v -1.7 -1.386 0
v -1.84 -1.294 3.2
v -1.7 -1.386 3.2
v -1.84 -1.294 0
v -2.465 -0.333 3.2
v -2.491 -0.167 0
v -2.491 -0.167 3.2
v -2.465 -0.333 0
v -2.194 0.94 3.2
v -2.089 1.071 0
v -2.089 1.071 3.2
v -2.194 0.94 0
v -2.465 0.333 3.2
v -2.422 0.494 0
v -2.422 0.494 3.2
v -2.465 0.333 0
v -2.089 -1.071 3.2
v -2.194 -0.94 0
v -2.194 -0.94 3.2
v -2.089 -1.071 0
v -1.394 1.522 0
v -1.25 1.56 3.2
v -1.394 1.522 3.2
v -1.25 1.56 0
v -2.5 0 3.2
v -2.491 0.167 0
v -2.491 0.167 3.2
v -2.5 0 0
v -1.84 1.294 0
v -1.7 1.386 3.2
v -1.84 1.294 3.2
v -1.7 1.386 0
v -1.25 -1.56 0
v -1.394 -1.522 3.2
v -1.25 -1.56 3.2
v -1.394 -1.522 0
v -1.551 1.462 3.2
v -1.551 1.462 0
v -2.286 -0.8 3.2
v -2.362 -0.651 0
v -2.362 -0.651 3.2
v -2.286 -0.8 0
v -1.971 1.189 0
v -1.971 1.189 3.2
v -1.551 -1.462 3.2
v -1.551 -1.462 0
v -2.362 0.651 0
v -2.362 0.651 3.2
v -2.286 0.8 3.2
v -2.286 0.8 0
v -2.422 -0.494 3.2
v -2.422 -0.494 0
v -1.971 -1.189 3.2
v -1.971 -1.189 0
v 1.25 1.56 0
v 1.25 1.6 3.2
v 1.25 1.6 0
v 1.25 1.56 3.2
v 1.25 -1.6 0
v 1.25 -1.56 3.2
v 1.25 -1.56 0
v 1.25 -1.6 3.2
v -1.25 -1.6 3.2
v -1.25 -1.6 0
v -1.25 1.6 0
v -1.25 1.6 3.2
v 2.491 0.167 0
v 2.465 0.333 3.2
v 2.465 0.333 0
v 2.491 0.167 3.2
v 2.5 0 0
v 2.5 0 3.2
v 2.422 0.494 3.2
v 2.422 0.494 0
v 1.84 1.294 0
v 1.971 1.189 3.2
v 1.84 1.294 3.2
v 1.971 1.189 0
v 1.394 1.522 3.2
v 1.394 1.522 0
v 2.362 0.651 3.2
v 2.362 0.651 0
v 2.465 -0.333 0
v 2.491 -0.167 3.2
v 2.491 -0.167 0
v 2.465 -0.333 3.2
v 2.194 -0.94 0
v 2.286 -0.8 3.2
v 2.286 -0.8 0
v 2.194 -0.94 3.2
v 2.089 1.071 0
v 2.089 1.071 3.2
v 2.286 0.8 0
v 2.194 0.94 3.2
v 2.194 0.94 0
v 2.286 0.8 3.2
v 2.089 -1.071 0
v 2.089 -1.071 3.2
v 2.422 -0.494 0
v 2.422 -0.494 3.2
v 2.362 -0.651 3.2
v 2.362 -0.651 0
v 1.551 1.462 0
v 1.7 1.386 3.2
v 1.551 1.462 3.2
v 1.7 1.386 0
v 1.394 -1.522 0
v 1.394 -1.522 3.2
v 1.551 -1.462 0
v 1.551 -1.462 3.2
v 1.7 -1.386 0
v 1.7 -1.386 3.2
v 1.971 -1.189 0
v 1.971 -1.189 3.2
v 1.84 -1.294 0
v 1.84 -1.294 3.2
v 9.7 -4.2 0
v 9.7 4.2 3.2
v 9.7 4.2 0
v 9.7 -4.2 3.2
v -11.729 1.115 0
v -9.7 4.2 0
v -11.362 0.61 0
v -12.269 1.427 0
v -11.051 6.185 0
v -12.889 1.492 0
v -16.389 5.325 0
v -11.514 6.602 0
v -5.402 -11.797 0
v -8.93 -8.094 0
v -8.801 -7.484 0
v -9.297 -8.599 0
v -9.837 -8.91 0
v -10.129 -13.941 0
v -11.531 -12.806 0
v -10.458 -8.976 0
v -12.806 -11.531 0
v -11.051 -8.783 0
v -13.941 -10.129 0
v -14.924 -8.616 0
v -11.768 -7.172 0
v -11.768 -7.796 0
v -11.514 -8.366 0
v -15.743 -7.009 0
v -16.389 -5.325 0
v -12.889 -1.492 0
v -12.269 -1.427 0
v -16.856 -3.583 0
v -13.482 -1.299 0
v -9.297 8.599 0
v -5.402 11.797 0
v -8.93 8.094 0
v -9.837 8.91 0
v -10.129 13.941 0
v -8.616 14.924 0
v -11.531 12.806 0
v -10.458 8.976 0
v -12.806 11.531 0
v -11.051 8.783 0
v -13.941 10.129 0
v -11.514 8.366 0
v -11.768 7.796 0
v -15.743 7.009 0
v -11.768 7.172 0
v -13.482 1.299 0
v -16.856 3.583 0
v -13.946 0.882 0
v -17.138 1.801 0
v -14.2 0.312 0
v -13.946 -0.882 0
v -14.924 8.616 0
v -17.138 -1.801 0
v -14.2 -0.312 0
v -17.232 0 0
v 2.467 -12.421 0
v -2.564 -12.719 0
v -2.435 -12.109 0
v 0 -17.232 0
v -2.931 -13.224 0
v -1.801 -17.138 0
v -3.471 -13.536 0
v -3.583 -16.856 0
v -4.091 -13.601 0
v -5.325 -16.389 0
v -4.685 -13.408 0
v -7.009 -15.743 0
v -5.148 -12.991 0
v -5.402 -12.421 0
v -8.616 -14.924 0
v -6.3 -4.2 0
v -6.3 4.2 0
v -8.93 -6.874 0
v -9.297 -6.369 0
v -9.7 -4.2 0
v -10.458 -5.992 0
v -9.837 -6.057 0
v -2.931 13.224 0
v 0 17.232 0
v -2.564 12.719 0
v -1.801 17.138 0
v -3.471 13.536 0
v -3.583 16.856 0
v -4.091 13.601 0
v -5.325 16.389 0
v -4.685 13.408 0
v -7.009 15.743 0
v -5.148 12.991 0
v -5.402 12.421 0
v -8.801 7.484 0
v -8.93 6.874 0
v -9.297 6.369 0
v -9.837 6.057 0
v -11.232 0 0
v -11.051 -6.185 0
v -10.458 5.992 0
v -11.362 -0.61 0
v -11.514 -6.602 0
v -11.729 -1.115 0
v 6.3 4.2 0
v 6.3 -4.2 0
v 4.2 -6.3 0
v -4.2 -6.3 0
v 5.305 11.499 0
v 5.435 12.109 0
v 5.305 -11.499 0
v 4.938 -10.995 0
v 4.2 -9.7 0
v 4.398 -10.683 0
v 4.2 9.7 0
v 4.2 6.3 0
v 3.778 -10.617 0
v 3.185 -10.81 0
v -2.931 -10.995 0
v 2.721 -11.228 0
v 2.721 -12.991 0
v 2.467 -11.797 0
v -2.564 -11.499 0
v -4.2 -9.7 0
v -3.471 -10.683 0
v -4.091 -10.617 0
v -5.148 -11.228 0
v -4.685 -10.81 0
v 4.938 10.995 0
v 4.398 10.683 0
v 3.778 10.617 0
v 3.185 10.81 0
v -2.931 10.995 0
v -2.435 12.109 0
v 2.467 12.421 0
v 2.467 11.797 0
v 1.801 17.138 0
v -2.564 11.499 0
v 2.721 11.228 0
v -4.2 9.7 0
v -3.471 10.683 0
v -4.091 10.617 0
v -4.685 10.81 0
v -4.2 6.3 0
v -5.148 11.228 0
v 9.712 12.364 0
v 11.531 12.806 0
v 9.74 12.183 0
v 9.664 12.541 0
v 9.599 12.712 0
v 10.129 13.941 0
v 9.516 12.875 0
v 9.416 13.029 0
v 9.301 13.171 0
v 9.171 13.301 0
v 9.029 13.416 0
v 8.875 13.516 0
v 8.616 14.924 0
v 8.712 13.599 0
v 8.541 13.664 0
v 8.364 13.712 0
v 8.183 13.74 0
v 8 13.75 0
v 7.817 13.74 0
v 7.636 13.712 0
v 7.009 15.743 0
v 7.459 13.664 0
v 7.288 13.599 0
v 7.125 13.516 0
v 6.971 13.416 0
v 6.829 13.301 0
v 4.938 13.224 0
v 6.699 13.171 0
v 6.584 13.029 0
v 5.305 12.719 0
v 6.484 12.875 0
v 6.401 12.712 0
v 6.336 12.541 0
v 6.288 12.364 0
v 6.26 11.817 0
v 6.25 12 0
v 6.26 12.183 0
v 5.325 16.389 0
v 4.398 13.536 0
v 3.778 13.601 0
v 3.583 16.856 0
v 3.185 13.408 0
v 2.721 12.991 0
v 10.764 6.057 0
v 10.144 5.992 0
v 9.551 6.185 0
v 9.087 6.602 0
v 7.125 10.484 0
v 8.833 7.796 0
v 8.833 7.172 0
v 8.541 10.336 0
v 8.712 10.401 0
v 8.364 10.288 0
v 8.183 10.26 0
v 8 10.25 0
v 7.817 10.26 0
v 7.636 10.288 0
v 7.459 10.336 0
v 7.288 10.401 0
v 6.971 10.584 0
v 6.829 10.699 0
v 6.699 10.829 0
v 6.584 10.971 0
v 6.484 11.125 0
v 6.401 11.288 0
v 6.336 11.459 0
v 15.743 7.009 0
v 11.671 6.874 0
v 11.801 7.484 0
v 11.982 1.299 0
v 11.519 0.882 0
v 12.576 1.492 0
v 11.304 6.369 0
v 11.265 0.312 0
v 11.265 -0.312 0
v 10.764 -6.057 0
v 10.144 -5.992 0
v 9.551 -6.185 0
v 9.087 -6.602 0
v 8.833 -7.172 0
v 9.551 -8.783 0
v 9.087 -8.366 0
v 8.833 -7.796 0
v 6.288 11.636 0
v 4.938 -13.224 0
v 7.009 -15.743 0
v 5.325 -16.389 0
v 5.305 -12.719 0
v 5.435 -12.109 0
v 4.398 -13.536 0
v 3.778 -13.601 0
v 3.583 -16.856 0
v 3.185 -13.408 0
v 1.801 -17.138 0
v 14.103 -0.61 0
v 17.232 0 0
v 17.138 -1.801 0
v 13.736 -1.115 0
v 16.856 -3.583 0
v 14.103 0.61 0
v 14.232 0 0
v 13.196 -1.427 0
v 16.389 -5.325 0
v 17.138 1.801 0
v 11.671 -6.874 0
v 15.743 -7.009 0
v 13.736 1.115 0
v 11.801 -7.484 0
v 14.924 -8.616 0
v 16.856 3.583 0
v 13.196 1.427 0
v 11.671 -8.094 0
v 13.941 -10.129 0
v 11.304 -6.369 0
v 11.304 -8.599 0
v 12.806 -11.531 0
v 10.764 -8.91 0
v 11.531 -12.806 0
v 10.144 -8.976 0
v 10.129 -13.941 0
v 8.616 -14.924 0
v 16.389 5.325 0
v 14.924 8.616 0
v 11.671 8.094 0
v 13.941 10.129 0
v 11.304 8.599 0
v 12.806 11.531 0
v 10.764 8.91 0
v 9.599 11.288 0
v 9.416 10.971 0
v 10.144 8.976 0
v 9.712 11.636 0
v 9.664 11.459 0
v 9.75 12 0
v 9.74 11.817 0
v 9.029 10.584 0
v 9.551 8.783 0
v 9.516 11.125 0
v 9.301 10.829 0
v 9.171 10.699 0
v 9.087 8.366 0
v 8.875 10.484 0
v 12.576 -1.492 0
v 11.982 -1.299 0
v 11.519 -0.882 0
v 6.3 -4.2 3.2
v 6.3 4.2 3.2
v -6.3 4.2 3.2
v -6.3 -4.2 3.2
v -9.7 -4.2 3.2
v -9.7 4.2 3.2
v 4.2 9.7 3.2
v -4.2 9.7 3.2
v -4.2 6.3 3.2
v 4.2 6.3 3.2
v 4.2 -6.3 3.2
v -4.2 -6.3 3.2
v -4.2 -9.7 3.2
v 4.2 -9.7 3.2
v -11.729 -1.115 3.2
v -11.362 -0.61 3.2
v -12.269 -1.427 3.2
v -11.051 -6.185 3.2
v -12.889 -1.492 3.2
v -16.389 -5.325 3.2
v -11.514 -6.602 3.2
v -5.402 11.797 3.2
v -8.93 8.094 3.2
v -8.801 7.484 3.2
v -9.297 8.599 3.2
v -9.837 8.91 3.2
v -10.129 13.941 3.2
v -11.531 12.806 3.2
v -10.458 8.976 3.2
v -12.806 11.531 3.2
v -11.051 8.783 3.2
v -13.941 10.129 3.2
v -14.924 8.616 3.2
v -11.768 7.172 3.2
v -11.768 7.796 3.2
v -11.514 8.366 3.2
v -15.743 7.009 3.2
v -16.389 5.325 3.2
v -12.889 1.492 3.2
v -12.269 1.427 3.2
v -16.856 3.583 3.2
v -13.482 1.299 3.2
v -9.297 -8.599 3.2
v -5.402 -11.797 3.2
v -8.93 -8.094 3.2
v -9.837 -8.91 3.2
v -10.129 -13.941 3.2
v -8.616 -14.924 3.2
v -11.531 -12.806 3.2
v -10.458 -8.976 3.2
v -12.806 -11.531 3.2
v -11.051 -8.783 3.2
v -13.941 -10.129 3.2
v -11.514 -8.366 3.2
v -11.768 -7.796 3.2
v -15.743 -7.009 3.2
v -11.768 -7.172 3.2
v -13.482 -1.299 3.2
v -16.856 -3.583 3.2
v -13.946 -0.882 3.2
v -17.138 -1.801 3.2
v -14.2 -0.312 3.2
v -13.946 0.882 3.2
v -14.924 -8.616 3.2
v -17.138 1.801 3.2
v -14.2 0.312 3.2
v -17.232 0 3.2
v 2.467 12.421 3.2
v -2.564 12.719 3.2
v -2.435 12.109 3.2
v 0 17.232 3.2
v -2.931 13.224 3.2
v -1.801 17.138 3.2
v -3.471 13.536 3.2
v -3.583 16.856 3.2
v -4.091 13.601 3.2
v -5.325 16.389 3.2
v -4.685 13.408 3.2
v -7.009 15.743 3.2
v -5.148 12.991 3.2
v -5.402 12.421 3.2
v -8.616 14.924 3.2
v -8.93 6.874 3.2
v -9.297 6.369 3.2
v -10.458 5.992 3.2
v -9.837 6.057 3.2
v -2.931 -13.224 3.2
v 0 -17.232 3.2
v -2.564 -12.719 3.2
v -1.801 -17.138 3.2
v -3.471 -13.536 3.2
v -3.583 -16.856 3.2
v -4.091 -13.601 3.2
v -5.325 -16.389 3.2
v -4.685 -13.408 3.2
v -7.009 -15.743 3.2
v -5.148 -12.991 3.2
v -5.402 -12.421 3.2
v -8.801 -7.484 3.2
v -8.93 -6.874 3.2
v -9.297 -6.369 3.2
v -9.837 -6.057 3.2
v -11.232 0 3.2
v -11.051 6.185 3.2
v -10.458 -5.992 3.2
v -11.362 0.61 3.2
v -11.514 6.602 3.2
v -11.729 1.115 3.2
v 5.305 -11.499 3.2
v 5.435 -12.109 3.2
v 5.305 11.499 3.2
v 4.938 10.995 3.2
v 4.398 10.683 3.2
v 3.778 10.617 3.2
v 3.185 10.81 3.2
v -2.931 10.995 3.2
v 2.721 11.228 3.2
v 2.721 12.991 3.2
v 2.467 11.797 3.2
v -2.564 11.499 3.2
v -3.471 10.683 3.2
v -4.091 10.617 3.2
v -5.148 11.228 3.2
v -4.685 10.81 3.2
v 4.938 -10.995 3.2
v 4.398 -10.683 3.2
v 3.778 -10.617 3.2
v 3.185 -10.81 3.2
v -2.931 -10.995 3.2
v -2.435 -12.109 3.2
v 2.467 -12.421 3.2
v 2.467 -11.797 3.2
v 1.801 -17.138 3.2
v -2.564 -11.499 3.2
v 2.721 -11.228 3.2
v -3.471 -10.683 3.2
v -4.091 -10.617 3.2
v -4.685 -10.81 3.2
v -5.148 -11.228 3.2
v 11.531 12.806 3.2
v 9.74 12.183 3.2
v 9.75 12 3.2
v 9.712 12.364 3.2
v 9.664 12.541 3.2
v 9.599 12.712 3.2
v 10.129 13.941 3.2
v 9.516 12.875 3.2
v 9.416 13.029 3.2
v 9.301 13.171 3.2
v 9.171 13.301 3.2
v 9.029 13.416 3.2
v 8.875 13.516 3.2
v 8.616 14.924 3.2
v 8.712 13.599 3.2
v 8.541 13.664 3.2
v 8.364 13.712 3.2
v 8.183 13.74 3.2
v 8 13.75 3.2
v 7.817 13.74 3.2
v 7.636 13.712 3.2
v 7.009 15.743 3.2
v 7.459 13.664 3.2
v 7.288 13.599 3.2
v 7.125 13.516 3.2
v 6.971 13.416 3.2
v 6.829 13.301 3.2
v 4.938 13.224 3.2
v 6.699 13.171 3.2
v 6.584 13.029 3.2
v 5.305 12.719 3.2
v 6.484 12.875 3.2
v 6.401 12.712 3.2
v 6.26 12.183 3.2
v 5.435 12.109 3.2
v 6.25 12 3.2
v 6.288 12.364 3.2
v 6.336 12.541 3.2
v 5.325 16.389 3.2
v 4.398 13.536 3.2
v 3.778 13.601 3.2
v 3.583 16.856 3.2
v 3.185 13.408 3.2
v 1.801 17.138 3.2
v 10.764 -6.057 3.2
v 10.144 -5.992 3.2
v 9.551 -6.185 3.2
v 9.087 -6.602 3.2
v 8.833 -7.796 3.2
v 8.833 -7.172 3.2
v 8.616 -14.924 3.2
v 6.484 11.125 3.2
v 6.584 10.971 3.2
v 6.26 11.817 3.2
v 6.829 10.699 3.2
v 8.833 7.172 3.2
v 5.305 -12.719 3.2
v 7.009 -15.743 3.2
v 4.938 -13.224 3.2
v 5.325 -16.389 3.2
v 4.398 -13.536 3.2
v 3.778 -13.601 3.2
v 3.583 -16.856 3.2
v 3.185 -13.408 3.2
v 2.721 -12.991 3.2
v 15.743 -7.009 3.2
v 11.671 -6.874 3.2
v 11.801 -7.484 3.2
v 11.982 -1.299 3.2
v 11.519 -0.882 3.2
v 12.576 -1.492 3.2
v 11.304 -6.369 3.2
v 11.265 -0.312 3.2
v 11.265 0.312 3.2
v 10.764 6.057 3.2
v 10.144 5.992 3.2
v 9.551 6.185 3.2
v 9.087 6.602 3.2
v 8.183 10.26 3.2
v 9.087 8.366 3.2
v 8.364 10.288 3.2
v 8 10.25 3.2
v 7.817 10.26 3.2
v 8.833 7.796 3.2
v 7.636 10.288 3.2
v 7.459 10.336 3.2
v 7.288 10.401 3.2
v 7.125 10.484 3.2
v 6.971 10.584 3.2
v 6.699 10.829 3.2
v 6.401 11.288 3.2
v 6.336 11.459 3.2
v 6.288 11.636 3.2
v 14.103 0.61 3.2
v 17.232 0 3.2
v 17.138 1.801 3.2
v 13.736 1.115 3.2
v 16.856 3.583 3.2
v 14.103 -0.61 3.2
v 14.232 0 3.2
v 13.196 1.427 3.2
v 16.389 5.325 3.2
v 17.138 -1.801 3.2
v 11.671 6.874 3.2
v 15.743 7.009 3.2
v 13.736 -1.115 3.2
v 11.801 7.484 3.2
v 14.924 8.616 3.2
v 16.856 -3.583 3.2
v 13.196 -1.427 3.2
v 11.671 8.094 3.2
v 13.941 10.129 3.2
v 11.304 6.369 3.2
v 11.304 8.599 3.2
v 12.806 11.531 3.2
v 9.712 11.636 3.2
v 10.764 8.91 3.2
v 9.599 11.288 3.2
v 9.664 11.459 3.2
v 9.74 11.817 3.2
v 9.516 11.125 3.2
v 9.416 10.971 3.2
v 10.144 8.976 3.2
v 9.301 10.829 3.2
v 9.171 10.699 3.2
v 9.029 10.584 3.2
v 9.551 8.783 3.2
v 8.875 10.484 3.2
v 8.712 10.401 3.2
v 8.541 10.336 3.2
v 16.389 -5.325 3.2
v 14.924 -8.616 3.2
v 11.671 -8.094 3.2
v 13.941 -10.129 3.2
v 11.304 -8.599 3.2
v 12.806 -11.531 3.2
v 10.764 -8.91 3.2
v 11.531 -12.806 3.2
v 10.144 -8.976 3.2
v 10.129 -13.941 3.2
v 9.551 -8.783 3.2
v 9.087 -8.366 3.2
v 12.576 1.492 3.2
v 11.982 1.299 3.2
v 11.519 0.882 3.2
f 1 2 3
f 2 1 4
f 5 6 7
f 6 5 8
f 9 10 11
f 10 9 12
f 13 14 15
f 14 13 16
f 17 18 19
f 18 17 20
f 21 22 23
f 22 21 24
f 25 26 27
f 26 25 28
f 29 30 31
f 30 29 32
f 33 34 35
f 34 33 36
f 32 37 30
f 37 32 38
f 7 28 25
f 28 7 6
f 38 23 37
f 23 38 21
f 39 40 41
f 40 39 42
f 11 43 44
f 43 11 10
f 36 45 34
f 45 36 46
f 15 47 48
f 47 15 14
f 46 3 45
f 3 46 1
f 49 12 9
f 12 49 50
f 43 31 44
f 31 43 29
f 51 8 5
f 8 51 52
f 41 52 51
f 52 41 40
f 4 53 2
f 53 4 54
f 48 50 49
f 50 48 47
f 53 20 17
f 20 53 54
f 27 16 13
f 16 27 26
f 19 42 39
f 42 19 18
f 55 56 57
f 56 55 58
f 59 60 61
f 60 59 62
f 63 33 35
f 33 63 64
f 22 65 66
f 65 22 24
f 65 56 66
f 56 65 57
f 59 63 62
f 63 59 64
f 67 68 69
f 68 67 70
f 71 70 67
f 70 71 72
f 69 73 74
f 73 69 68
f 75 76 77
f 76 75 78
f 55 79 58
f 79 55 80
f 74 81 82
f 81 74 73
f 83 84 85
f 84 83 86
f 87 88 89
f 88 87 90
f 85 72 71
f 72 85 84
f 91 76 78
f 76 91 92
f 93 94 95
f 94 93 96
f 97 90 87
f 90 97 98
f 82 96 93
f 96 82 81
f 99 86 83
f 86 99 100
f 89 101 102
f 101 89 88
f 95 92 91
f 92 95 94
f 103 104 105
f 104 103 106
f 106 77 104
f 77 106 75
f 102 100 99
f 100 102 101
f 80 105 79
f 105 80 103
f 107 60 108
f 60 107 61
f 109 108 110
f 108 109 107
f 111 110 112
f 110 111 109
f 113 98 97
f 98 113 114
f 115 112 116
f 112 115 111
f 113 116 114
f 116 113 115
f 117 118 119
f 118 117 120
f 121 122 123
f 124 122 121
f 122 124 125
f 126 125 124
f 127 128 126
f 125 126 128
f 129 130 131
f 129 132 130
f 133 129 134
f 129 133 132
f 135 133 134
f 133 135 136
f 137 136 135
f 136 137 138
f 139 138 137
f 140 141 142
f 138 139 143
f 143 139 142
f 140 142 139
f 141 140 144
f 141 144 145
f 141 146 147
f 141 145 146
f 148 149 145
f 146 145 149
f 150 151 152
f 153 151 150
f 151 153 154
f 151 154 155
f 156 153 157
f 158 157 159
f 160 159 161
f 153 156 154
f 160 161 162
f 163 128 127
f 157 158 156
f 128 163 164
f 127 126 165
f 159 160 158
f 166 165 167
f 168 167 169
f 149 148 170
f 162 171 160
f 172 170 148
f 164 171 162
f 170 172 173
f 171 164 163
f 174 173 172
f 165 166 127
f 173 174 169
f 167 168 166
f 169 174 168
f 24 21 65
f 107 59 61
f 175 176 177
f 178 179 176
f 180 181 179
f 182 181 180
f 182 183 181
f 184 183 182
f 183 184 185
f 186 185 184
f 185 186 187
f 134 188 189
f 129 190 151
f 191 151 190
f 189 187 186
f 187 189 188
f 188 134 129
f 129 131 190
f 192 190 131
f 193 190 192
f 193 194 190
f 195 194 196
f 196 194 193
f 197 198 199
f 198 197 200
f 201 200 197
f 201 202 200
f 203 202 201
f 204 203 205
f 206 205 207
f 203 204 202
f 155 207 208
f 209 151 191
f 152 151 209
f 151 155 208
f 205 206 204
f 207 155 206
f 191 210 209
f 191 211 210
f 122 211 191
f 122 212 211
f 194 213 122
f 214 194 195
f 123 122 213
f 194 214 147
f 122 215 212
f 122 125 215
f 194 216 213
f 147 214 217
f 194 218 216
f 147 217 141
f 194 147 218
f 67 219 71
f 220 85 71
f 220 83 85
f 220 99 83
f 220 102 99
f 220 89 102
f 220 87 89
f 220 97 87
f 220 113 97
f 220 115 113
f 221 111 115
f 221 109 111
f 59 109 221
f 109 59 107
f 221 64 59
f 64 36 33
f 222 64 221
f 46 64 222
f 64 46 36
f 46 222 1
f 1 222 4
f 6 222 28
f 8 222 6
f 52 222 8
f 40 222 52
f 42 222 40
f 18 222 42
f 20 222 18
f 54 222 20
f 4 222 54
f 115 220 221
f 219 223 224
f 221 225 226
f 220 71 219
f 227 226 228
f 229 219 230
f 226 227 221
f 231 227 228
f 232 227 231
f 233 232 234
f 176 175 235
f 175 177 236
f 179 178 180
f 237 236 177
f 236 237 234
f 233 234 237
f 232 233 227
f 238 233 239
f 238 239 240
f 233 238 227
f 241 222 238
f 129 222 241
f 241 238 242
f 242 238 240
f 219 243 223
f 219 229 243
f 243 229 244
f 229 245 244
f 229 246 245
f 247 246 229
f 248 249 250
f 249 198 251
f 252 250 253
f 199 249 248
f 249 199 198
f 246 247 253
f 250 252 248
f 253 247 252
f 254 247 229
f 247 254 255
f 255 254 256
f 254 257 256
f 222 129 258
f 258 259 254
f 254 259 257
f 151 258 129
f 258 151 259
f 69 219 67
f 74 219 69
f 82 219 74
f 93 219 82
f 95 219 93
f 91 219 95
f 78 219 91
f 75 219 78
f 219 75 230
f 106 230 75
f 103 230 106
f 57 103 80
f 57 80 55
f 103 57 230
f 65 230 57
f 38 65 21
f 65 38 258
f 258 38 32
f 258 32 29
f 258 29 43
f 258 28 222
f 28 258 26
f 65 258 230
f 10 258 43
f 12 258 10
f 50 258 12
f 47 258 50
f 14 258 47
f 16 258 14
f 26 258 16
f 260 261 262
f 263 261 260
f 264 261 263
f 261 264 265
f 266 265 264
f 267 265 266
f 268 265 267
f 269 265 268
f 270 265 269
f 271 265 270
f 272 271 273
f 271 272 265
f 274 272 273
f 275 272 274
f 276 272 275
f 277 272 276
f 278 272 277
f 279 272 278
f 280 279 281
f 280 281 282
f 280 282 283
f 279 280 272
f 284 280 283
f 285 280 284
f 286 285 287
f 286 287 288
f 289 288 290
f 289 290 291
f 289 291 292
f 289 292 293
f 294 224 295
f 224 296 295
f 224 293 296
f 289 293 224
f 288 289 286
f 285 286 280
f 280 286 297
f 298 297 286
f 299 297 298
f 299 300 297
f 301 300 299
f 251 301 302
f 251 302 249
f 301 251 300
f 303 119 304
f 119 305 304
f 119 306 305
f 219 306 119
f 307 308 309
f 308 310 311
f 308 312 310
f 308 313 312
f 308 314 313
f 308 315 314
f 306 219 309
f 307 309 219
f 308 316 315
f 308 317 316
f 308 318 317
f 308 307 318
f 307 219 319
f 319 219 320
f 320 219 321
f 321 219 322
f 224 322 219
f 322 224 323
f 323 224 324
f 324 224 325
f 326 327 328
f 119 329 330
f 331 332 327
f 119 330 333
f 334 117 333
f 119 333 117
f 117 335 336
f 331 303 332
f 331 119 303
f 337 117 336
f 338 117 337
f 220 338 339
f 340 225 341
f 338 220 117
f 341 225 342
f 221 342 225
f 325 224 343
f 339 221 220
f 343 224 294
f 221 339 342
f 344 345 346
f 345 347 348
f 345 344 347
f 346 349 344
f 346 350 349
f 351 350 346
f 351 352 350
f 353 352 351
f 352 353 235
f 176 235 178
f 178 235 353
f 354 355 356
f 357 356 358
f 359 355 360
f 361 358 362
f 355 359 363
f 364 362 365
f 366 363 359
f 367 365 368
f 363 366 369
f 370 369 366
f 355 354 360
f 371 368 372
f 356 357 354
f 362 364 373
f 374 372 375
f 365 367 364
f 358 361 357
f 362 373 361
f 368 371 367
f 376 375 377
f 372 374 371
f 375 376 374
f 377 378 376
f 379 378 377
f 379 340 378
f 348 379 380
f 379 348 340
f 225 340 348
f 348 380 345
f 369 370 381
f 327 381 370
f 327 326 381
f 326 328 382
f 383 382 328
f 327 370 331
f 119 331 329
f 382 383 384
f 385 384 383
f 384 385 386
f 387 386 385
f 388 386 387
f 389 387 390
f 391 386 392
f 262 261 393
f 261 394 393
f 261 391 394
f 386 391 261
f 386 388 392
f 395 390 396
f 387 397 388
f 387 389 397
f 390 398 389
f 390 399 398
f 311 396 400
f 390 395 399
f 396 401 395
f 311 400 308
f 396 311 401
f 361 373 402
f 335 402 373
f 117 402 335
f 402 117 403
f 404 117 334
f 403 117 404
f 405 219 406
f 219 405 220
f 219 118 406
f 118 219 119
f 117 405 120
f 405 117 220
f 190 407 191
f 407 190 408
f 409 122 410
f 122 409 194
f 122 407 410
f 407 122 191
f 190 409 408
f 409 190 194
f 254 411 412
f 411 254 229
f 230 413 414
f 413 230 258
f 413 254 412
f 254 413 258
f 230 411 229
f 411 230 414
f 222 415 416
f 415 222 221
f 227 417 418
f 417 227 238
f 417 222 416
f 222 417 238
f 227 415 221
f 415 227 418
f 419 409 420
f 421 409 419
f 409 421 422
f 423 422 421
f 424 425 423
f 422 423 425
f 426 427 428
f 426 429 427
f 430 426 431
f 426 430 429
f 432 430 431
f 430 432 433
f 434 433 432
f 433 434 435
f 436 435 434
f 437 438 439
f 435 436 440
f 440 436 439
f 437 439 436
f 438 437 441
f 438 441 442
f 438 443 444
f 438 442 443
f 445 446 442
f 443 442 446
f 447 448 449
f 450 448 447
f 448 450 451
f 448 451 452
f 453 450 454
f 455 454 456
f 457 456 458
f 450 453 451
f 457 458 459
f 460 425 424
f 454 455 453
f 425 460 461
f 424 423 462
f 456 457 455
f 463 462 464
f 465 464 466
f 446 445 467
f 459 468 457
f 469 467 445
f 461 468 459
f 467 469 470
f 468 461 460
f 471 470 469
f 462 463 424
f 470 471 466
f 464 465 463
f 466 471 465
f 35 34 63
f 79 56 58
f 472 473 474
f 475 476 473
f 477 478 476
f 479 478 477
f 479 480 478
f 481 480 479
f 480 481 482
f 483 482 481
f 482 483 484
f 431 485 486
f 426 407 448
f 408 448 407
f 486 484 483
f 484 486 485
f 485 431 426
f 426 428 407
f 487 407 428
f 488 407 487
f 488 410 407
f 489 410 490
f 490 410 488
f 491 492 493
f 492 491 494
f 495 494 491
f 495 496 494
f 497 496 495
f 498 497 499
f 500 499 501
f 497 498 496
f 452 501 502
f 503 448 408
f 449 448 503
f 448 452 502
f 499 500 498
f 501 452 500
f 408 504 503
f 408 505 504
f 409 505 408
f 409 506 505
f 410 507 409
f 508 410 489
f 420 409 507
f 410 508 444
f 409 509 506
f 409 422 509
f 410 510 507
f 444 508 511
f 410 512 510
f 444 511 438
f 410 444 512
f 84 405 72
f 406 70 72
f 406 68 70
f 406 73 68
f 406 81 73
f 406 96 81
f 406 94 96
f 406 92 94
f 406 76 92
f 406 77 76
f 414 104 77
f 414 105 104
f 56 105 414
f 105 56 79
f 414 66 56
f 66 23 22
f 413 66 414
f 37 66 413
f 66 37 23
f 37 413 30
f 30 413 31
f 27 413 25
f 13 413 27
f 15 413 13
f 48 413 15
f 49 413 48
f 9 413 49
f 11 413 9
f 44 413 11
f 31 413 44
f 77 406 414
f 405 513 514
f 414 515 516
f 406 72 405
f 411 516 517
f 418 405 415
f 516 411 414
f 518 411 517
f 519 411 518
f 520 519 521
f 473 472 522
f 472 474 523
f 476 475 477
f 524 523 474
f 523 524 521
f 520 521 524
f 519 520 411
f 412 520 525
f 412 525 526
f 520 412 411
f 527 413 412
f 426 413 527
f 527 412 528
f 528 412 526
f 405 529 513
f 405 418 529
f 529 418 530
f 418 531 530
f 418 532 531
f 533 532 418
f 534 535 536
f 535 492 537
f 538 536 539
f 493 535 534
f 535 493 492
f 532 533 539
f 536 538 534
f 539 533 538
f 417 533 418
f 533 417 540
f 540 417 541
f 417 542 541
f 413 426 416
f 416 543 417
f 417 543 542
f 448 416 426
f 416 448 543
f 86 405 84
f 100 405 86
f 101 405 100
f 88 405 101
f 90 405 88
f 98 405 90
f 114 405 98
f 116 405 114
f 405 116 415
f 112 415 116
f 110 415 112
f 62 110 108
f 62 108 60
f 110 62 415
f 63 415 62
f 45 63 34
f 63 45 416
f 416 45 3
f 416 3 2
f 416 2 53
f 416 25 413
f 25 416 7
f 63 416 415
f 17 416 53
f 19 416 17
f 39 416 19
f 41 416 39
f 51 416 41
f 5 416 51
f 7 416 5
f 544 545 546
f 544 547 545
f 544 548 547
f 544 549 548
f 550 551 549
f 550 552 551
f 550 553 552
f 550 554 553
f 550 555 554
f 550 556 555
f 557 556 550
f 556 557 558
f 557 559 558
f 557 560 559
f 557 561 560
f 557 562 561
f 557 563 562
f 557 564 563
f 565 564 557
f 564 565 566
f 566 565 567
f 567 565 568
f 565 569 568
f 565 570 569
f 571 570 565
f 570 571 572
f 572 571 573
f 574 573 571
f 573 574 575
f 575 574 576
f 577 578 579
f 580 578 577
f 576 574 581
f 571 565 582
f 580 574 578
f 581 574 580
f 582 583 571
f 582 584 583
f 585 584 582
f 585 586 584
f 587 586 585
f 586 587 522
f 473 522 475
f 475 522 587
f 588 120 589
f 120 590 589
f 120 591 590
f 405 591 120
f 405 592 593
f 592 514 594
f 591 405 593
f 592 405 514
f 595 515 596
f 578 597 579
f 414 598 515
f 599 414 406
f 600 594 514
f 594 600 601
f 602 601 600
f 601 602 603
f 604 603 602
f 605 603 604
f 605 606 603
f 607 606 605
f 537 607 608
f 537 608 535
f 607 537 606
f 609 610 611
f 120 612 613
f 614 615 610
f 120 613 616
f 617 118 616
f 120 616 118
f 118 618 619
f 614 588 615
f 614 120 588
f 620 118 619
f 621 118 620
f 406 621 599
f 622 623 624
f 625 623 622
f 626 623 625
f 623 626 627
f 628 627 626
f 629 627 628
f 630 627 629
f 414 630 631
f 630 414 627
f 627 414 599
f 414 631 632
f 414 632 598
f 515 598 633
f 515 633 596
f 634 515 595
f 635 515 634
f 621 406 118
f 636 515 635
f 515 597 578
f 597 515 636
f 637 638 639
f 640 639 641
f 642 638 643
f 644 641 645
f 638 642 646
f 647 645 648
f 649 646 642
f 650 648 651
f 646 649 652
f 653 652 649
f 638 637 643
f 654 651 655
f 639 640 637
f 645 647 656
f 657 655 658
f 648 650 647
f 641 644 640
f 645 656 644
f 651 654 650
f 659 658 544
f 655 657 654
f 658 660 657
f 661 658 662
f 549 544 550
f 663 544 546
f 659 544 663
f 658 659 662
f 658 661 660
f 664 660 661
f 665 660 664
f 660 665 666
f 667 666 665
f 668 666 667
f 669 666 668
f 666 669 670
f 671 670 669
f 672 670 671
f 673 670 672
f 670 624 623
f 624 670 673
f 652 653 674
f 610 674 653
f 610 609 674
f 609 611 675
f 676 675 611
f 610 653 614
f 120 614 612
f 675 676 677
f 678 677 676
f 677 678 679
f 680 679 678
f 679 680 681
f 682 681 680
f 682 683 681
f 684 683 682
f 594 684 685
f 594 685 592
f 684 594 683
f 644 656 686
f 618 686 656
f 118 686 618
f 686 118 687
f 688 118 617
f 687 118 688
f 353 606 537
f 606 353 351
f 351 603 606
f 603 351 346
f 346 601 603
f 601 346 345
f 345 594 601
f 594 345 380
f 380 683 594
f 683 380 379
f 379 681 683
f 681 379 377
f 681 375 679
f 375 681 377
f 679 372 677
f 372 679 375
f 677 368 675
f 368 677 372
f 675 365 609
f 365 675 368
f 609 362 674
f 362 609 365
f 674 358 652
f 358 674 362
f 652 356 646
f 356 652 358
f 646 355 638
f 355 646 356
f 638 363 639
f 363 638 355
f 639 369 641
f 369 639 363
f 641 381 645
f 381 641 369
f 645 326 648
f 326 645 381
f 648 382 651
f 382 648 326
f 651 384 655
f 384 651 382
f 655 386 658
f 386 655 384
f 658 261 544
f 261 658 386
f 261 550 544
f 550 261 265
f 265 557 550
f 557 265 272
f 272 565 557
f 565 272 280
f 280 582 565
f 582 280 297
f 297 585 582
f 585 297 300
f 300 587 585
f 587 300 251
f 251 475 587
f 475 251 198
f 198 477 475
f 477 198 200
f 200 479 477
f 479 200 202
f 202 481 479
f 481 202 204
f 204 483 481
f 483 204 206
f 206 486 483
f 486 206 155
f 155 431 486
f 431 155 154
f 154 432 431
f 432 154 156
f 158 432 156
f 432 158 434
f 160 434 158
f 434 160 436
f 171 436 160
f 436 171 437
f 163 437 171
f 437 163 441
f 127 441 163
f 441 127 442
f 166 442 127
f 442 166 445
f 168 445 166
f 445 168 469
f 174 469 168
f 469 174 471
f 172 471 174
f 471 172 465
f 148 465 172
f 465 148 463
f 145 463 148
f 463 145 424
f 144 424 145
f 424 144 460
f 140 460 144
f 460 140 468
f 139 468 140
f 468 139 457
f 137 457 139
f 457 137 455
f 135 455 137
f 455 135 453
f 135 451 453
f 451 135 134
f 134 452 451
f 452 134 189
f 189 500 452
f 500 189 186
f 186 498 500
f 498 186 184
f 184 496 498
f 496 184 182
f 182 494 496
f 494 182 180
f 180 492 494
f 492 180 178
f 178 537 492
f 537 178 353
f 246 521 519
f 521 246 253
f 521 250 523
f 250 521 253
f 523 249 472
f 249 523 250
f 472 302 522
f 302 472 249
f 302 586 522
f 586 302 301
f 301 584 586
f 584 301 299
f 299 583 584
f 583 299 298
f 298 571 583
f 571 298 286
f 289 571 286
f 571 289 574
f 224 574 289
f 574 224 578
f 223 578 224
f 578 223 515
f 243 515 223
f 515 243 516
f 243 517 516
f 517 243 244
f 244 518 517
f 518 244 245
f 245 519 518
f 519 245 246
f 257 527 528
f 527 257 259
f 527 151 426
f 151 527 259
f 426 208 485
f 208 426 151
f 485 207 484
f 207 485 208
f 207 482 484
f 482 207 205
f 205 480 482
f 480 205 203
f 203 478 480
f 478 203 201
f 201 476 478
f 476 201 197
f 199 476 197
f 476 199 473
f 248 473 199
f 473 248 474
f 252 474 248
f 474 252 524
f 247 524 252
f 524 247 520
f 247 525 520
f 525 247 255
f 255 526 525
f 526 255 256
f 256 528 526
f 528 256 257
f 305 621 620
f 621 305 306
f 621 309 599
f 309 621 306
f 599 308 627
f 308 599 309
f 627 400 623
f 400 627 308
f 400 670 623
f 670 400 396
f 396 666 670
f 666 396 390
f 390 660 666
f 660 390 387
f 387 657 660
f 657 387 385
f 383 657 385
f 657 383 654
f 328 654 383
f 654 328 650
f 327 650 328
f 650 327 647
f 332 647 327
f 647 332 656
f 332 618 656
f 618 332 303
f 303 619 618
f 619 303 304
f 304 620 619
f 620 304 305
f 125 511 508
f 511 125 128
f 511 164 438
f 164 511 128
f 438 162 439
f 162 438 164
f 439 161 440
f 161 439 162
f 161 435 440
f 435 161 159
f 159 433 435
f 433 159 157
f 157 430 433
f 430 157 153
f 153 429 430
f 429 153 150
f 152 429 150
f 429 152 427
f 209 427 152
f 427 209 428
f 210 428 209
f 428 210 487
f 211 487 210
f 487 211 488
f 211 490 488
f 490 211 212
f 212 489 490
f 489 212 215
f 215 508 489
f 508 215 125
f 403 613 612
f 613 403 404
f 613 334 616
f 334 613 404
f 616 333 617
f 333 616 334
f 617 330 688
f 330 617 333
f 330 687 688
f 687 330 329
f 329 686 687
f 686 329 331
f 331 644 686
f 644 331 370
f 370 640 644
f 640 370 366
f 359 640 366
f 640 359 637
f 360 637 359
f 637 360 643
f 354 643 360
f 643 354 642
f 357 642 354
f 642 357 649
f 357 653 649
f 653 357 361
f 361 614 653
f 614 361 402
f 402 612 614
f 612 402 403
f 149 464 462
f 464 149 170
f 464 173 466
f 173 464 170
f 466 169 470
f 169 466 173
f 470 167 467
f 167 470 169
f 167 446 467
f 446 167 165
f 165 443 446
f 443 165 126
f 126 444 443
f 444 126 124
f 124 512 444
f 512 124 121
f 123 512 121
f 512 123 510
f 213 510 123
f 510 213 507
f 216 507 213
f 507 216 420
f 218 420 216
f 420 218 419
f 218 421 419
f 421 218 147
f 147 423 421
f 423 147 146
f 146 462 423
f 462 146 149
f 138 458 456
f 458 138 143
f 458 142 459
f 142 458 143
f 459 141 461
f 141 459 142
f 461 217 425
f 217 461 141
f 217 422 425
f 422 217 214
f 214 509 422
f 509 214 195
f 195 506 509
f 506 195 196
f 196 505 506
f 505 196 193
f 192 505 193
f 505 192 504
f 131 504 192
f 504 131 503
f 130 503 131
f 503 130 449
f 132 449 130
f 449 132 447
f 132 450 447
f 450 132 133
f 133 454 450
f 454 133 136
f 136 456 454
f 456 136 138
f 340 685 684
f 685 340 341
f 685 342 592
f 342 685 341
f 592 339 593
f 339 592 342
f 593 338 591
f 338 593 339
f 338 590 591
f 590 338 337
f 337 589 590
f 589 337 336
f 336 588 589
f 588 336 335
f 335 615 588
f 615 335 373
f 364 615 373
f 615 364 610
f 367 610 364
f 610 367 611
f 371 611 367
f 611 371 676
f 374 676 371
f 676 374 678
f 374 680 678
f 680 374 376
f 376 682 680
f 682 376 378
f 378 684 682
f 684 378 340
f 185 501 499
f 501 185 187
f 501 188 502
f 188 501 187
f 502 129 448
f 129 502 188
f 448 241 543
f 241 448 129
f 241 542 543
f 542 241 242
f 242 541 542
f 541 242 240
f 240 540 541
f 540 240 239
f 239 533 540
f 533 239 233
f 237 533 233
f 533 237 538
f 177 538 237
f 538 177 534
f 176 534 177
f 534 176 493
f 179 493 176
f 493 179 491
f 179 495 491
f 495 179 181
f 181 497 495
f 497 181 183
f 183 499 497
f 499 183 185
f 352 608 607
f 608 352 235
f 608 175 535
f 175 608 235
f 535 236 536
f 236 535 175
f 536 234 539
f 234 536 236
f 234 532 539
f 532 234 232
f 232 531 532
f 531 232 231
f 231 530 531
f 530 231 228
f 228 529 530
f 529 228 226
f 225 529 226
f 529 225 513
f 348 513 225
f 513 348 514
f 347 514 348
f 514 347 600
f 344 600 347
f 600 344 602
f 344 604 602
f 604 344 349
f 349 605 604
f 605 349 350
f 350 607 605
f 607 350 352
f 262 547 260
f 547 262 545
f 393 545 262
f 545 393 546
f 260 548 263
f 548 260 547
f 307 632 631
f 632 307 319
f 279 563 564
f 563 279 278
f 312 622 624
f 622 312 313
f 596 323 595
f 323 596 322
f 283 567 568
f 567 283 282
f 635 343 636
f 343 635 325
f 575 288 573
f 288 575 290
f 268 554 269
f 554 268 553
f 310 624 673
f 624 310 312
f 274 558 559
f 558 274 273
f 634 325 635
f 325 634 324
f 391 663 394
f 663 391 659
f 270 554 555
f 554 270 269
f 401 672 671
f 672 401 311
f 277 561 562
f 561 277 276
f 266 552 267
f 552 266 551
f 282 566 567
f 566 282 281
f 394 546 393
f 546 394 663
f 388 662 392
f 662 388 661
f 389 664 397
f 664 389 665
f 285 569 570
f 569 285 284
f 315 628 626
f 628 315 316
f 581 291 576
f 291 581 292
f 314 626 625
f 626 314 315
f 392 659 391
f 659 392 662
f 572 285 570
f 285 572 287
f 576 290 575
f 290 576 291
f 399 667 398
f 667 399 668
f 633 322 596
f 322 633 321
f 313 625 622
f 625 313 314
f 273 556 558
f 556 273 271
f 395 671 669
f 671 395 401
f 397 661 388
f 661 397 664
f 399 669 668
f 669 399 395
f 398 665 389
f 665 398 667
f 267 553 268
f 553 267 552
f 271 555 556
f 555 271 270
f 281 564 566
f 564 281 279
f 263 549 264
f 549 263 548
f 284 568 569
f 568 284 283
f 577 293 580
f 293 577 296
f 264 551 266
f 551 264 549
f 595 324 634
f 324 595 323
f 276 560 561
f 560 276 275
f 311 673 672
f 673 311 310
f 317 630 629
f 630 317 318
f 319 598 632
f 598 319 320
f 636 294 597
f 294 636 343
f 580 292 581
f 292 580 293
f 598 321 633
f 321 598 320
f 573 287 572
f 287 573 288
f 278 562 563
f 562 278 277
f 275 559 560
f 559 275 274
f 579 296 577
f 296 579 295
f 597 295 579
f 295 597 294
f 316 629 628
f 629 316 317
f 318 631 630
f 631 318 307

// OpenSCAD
// file: spool.scad
/*
   Copyright 2015-2016 Scott Bezek and the splitflap contributors

   Licensed under the Apache License, Version 2.0 (the "License");
   you may not use this file except in compliance with the License.
   You may obtain a copy of the License at

       http://www.apache.org/licenses/LICENSE-2.0

   Unless required by applicable law or agreed to in writing, software
   distributed under the License is distributed on an "AS IS" BASIS,
   WITHOUT WARRANTIES OR CONDITIONS OF ANY KIND, either express or implied.
   See the License for the specific language governing permissions and
   limitations under the License.
*/

module flap_spool(flaps, flap_hole_radius, flap_hole_separation, outset, height) {
    pitch_radius = flap_spool_pitch_radius(flaps, flap_hole_radius, flap_hole_separation);
    outer_radius = flap_spool_outer_radius(flaps, flap_hole_radius, flap_hole_separation, outset);


    module flap_spool_2d() {
        difference() {
            circle(r=outer_radius, $fn=60);
            for (i = [0 : flaps - 1]) {
                translate([cos(360/flaps*i)*pitch_radius, sin(360/flaps*i)*pitch_radius]) circle(r=flap_hole_radius, $fn=15);
            }
        }
    }

    if (height > 0) {
        linear_extrude(height) {
            flap_spool_2d();
        }
    } else {
        flap_spool_2d();
    }
}

module flap_spool_home_indicator(flaps, flap_hole_radius, flap_hole_separation, outset, height=0) {
    pitch_radius = flap_spool_pitch_radius(flaps, flap_hole_radius, flap_hole_separation);
    outer_radius = flap_spool_outer_radius(flaps, flap_hole_radius, flap_hole_separation, outset);

    module flap_spool_home_indicator_2d() {
        translate([pitch_radius -flap_hole_radius * 3, 0]) {
            hull() {
                circle(r=flap_hole_radius/2, $fn=30);
                translate([-flap_hole_radius * 1.25, 0]) {
                    circle(r=flap_hole_radius/2, $fn=30);
                }
            }
        }
    }

    if (height > 0) {
        // convexity parameter fixes 'difference()' face polarity in preview mode... somehow
        linear_extrude(height, convexity=2)
            flap_spool_home_indicator_2d();
    } else {
        flap_spool_home_indicator_2d();
    }
}

function flap_spool_pitch_radius(flaps, flap_hole_radius, separation) = 
    flaps * (flap_hole_radius*2 + separation) / (2*PI);

function flap_spool_outer_radius(flaps, flap_hole_radius, separation, outset) = 
    flap_spool_pitch_radius(flaps, flap_hole_radius, separation) + flap_hole_radius + outset;


flap_spool(40, 1.5, 5, 3, 3.2);
// main file
// Spoolantrieb

spool_antrieb = true;
spool_achse = false;
spool = false;
achsteil = false;


use <spool.scad>

// Achsmaße
b=3.2;
l=5.0;
o=8;

module Achse28BY48() {
    union(){
        $fn=60;
        translate([-l/2+b/2,0,0])
        cylinder(h=o,r=b/2, center=true);
        cube([l/2,b,o], center=true);
        translate([l/2-b/2,0,0])
        cylinder(h=o,r=b/2, center=true);
    }
}

module spool_achsteil(toleranz=0) {
    b=8.2;
    l=3.2;
    o=55;
    translate([0,0,o/2])
    {
        cube([l+toleranz,b+toleranz,o],center=true);
        cube([l,b+3,o-7],center=true);
    }
}

module spool_achse(toleranz=0) {
    for (i=[1,-1]) {
        translate([8*i,0,0])
        spool_achsteil(toleranz);
    }        
    for (j=[1,-1]) {
        translate([0,8*j,0])
        rotate([0,0,90])
        spool_achsteil(toleranz);
    }
}

module magnetloch() {
    translate([8,12,0])
    cylinder(h=50,d=3.5, $fn=60, center=true);
}

module spool_antrieb() {
    difference() {
        flap_spool(10, 1.5, 5, 3, 3.2);
        Achse28BY48();
        spool_achse(0.2);
        magnetloch();
    }
}
module achsloch() {
    cylinder(h=50,d=3.5, $fn=60, center=true);
}

module spool() {
    translate([0,0,55-3.2])
    difference() {
        flap_spool(10, 1.5, 5, 3, 3.2);
        achsloch();
        spool_achse(0.2);
    } 
}

if (spool_antrieb) spool_antrieb();
if (spool_achse) spool_achse();
if (spool) spool();
if (achsteil) spool_achsteil();
